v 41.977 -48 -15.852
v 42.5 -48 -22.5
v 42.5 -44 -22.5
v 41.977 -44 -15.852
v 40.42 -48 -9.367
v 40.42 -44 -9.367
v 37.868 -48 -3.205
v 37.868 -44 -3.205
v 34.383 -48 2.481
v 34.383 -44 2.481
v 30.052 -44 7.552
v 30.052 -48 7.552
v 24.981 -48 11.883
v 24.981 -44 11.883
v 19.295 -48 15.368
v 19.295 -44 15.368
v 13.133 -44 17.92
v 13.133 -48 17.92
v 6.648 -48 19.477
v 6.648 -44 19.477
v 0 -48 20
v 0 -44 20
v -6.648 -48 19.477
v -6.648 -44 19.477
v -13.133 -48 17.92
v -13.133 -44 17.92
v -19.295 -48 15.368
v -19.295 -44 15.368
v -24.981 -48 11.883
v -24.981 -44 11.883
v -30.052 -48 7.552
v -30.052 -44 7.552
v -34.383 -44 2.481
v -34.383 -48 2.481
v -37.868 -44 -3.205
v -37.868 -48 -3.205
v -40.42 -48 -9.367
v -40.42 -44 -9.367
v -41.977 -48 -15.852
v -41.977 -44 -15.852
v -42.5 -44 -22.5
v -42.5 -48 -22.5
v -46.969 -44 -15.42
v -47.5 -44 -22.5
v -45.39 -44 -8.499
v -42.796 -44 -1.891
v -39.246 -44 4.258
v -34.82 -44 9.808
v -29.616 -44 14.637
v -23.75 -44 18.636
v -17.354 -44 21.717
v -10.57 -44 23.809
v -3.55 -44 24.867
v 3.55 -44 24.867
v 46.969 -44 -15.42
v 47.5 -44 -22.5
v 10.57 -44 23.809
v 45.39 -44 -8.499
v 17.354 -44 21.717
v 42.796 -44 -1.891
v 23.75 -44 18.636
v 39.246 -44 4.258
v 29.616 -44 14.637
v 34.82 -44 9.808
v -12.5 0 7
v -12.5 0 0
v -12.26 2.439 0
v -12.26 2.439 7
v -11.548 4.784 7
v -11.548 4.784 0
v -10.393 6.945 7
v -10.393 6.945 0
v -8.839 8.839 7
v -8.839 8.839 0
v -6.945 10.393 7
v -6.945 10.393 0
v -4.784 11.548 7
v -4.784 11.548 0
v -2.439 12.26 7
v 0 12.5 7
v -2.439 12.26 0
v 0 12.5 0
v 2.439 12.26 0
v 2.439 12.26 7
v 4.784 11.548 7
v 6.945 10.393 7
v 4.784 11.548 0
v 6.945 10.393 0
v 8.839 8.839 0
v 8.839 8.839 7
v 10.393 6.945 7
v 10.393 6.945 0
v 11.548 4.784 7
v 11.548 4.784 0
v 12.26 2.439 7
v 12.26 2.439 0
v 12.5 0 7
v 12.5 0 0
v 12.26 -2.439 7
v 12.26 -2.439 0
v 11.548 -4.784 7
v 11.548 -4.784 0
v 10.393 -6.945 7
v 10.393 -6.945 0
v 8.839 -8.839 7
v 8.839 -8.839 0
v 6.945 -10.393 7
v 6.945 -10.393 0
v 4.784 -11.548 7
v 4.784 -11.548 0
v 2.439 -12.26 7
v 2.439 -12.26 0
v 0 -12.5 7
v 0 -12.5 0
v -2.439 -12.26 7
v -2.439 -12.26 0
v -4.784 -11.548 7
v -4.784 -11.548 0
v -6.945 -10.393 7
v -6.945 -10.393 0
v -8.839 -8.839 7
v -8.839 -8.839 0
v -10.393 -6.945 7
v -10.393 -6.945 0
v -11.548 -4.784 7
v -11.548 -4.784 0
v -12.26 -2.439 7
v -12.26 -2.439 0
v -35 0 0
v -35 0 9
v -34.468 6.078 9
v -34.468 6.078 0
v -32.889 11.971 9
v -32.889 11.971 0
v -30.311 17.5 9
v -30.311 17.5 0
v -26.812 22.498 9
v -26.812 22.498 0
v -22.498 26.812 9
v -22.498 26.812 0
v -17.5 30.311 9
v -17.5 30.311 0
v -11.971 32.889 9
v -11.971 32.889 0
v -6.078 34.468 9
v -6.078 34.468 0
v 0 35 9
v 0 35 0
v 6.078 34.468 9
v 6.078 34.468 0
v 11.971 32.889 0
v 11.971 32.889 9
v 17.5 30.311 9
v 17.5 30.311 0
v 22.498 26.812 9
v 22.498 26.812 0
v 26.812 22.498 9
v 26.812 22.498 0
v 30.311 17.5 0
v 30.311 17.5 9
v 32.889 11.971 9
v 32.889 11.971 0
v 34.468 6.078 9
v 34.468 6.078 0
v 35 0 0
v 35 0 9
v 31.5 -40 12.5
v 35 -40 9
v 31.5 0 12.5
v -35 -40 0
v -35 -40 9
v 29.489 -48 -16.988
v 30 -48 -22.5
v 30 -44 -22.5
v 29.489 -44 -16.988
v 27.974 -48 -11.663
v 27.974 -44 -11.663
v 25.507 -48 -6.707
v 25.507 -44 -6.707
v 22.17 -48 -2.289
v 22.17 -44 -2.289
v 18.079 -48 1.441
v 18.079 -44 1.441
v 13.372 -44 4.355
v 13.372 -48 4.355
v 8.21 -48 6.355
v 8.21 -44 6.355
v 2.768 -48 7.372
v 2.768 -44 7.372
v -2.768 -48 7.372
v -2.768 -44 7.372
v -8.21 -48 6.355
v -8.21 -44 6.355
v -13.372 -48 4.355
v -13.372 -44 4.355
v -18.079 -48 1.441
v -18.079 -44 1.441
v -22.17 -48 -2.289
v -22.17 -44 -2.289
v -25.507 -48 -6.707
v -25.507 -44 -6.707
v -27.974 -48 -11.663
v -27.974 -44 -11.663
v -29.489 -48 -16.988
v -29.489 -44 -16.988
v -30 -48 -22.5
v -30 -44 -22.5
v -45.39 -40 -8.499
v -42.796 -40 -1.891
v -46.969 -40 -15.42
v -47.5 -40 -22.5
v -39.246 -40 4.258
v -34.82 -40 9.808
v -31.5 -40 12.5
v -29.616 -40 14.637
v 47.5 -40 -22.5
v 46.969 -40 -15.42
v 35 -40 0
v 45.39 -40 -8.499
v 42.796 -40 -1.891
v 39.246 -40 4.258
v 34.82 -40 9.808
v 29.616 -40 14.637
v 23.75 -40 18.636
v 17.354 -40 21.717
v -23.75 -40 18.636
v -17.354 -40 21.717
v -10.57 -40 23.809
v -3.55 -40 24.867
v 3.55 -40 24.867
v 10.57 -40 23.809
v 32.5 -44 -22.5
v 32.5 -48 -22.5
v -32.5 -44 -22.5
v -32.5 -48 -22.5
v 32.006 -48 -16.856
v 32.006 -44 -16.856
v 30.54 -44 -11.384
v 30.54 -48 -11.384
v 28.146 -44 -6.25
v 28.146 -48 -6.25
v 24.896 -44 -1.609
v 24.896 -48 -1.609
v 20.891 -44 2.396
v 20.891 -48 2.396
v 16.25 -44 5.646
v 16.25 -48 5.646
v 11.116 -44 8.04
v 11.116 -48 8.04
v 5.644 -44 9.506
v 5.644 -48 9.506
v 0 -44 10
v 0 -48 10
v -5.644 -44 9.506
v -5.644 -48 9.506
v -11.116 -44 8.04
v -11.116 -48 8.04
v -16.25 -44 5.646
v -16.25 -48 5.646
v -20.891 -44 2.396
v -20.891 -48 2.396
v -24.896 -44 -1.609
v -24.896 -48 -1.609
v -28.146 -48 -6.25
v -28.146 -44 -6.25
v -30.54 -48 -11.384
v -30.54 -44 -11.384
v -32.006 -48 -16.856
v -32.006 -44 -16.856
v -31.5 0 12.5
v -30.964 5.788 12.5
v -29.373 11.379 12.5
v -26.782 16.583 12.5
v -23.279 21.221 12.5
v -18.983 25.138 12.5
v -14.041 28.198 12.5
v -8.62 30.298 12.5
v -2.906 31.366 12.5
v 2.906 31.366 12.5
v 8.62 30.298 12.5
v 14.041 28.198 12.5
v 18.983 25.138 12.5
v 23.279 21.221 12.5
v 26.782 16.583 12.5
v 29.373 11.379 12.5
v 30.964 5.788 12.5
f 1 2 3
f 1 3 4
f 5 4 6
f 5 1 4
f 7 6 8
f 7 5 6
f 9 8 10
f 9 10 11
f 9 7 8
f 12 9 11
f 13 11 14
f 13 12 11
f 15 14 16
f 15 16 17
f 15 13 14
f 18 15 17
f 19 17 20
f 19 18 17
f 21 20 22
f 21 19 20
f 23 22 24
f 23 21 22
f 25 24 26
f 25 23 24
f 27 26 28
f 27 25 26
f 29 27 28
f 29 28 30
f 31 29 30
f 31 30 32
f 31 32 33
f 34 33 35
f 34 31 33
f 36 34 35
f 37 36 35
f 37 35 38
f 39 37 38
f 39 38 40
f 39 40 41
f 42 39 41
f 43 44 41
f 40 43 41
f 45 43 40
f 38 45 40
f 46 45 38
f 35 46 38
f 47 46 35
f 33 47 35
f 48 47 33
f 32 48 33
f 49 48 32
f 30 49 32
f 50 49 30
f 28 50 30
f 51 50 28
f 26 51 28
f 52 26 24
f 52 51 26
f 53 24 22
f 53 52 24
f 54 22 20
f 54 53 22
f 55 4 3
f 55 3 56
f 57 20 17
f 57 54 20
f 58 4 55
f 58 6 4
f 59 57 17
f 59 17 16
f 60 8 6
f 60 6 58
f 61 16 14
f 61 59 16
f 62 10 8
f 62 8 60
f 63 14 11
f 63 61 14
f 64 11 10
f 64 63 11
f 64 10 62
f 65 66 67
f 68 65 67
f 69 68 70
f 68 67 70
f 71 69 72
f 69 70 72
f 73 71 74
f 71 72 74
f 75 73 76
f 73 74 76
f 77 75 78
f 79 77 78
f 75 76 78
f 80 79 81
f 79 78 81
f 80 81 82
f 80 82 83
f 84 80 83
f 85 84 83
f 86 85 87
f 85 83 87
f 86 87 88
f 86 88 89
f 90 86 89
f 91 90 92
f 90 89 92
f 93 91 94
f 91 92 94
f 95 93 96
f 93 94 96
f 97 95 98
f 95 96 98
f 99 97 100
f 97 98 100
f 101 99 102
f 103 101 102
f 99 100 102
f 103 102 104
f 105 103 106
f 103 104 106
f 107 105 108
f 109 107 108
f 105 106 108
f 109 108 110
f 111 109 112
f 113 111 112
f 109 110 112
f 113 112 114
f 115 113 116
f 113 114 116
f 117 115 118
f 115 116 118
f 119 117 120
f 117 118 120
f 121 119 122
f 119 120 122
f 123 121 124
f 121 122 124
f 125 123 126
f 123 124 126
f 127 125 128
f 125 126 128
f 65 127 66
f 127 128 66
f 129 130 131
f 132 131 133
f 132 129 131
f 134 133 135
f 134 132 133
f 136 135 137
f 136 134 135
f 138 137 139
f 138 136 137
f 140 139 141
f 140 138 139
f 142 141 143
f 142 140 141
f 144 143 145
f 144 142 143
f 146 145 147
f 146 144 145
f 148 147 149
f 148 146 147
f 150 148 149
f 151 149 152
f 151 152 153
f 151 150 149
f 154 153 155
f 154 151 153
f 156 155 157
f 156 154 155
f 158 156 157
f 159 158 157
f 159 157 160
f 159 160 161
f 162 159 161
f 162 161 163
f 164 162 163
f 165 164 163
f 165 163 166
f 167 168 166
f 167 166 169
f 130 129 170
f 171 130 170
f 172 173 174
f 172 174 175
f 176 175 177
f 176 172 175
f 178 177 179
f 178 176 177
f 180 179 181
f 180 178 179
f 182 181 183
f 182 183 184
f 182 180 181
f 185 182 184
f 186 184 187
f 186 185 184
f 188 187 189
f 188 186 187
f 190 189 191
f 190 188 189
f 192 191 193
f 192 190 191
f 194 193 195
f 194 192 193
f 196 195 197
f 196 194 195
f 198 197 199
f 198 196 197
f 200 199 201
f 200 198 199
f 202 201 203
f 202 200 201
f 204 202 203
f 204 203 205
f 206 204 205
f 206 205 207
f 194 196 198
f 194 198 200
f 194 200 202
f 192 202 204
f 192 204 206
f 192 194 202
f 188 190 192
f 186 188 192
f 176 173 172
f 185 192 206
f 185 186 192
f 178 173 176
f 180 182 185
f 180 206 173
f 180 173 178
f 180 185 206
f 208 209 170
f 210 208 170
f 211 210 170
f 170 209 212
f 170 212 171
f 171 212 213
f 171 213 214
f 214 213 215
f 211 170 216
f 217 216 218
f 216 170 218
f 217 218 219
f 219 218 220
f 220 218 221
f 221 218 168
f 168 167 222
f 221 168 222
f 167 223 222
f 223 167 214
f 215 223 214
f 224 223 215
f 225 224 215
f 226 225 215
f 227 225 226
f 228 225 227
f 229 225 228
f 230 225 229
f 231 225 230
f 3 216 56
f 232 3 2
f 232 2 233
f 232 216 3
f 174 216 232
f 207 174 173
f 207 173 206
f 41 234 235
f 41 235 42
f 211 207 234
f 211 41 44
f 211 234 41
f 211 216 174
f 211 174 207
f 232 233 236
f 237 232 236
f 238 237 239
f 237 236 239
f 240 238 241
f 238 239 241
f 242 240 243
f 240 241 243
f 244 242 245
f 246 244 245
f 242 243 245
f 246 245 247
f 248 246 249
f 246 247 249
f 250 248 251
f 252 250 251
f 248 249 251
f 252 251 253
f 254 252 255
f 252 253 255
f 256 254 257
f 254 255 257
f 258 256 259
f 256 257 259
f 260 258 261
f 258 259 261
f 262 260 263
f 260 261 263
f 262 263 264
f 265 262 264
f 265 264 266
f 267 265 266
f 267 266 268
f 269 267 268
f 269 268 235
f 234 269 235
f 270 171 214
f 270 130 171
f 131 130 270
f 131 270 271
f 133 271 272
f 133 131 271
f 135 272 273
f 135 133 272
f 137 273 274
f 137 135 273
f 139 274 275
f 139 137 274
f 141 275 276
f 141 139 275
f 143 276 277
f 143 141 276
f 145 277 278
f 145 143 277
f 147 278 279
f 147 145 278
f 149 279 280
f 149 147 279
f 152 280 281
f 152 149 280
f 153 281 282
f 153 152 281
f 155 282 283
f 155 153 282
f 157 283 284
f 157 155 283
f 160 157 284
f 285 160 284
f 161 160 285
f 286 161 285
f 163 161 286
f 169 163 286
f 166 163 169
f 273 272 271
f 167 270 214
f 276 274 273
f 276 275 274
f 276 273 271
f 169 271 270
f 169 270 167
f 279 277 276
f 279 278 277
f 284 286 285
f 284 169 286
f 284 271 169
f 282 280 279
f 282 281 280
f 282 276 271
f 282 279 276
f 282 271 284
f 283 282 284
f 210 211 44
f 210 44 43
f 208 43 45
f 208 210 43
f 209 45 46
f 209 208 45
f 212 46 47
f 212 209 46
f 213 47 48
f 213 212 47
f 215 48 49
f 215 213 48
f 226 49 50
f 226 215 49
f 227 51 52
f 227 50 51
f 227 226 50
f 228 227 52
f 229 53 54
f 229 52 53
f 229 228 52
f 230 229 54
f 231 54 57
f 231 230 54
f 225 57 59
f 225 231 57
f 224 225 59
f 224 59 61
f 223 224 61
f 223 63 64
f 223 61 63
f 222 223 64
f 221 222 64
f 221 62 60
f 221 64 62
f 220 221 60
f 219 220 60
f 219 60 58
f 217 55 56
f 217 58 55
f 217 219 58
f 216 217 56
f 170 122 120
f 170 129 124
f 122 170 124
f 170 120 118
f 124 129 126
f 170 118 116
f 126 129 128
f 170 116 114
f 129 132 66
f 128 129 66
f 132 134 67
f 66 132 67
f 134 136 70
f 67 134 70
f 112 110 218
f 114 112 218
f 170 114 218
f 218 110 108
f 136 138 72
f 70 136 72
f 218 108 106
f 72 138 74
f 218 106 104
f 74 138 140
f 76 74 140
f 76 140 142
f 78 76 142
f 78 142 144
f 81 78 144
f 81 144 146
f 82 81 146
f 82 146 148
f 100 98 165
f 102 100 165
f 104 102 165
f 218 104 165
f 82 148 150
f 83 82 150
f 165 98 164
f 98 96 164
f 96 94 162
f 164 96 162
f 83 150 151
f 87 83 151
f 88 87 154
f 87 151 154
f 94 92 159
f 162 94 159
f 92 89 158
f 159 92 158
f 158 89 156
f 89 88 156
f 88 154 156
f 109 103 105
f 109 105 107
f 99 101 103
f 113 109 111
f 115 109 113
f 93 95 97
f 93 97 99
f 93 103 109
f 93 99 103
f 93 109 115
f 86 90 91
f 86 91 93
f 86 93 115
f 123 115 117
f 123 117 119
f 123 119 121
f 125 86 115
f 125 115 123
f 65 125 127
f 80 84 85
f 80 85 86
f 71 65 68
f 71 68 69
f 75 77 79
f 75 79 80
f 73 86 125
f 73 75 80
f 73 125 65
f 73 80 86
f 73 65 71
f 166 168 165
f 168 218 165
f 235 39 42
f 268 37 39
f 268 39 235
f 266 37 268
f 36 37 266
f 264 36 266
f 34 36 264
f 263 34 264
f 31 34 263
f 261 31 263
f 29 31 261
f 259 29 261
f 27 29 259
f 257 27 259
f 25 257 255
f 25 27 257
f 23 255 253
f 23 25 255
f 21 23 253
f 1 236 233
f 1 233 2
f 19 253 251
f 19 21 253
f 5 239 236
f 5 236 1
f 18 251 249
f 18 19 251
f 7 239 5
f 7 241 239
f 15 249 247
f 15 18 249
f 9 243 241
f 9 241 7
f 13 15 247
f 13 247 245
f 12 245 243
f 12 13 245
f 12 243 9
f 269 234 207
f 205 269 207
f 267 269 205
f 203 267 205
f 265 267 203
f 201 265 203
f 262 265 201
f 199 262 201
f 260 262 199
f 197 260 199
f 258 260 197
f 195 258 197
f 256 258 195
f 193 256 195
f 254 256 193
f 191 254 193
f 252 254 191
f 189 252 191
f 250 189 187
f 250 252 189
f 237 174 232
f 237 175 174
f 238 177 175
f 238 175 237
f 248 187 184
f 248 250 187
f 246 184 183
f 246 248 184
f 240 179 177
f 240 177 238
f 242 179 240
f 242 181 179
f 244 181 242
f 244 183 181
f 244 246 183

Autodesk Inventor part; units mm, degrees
ref_plane "YZ Plane" through (0, 0, 0) normal (1, 0, 0) x (0, 1, 0)
ref_plane "XZ Plane" through (0, 0, 0) normal (0, 1, 0) x (-1, 0, 0)
ref_plane "XY Plane" through (0, 0, 0) normal (0, 0, 1) x (1, 0, 0)
sketch "Sketch1" plane through (0, 0, 0) normal (0, 0, 1) x (1, 0, 0)
  circle A0 centre (0, 0) radius 35
  line L0 (-35, 0) -> (-35, -40)
  line L1 (-35, -40) -> (35, -40)
  line L2 (35, -40) -> (35, 0)
  dimension "d0" = 70
  dimension "d1" = 40
extrude "Extrusion1" add sketch "Sketch1" along normal blind 12.5
sketch "Sketch2" plane through (-35, -40, 0) normal (0, -1, 0) x (1, 0, 0)
  arc A0 (82.5, -22.5) -> (-12.5, -22.5) centre (35, -22.5) ccw
  line L0 (0, 12.5) -> (70, 12.5) construction
  line L1 (35, 12.5) -> (35, 0)
  line L2 (82.5, -22.5) -> (-12.5, -22.5)
  arc A1 (-12.5, -22.5) -> (82.5, -22.5) centre (35, -22.5) ccw construction
  dimension "d4" = 95
  dimension "d6" = 35
extrude "Extrusion2" add sketch "Sketch2" along normal blind 8
chamfer "Chamfer1" distance 3.5 angle 45 3 edges at (0, 35, 12.5) (-35, -20, 12.5) (35, -20, 12.5)
sketch "Sketch3" plane through (0, 0, 0) normal (0, 0, -1) x (-1, 0, 0)
  circle A0 centre (0, 0) radius 12.5
  dimension "d12" = 25
extrude "Extrusion3" cut sketch "Sketch3" against normal blind 7
sketch "Sketch4" plane through (-35, -48, 0) normal (0, -1, 0) x (1, 0, 0)
  arc A0 (82.5, -22.5) -> (-12.5, -22.5) centre (35, -22.5) ccw projected
  arc A1 (77.5, -22.5) -> (-7.5, -22.5) centre (35, -22.5) ccw
  arc A2 (82.5, -22.5) -> (-12.5, -22.5) centre (35, -22.5) ccw projected
  line L0 (-7.5, -22.5) -> (-12.5, -22.5)
  line L1 (82.5, -22.5) -> (77.5, -22.5)
  line L2 (-12.5, -22.5) -> (82.5, -22.5) projected
  circle A3 centre (35, -22.5) radius 32.5
  circle A4 centre (35, -22.5) radius 30
  point P0 (35, 0)
  point P1 (5, -22.5)
  point P2 (65, -22.5)
  point P3 (67.5, -22.5)
  point P4 (2.5, -22.5)
  dimension "d16" = 5
  dimension "d20" = 65
  dimension "d21" = 60
extrude "Extrusion4" cut sketch "Sketch4" against normal blind 4 contours L1 A1 L0 A0 | L2 A4 A3 picked at (43.6934, 7.7339)
properties part number "Base 1 left"
